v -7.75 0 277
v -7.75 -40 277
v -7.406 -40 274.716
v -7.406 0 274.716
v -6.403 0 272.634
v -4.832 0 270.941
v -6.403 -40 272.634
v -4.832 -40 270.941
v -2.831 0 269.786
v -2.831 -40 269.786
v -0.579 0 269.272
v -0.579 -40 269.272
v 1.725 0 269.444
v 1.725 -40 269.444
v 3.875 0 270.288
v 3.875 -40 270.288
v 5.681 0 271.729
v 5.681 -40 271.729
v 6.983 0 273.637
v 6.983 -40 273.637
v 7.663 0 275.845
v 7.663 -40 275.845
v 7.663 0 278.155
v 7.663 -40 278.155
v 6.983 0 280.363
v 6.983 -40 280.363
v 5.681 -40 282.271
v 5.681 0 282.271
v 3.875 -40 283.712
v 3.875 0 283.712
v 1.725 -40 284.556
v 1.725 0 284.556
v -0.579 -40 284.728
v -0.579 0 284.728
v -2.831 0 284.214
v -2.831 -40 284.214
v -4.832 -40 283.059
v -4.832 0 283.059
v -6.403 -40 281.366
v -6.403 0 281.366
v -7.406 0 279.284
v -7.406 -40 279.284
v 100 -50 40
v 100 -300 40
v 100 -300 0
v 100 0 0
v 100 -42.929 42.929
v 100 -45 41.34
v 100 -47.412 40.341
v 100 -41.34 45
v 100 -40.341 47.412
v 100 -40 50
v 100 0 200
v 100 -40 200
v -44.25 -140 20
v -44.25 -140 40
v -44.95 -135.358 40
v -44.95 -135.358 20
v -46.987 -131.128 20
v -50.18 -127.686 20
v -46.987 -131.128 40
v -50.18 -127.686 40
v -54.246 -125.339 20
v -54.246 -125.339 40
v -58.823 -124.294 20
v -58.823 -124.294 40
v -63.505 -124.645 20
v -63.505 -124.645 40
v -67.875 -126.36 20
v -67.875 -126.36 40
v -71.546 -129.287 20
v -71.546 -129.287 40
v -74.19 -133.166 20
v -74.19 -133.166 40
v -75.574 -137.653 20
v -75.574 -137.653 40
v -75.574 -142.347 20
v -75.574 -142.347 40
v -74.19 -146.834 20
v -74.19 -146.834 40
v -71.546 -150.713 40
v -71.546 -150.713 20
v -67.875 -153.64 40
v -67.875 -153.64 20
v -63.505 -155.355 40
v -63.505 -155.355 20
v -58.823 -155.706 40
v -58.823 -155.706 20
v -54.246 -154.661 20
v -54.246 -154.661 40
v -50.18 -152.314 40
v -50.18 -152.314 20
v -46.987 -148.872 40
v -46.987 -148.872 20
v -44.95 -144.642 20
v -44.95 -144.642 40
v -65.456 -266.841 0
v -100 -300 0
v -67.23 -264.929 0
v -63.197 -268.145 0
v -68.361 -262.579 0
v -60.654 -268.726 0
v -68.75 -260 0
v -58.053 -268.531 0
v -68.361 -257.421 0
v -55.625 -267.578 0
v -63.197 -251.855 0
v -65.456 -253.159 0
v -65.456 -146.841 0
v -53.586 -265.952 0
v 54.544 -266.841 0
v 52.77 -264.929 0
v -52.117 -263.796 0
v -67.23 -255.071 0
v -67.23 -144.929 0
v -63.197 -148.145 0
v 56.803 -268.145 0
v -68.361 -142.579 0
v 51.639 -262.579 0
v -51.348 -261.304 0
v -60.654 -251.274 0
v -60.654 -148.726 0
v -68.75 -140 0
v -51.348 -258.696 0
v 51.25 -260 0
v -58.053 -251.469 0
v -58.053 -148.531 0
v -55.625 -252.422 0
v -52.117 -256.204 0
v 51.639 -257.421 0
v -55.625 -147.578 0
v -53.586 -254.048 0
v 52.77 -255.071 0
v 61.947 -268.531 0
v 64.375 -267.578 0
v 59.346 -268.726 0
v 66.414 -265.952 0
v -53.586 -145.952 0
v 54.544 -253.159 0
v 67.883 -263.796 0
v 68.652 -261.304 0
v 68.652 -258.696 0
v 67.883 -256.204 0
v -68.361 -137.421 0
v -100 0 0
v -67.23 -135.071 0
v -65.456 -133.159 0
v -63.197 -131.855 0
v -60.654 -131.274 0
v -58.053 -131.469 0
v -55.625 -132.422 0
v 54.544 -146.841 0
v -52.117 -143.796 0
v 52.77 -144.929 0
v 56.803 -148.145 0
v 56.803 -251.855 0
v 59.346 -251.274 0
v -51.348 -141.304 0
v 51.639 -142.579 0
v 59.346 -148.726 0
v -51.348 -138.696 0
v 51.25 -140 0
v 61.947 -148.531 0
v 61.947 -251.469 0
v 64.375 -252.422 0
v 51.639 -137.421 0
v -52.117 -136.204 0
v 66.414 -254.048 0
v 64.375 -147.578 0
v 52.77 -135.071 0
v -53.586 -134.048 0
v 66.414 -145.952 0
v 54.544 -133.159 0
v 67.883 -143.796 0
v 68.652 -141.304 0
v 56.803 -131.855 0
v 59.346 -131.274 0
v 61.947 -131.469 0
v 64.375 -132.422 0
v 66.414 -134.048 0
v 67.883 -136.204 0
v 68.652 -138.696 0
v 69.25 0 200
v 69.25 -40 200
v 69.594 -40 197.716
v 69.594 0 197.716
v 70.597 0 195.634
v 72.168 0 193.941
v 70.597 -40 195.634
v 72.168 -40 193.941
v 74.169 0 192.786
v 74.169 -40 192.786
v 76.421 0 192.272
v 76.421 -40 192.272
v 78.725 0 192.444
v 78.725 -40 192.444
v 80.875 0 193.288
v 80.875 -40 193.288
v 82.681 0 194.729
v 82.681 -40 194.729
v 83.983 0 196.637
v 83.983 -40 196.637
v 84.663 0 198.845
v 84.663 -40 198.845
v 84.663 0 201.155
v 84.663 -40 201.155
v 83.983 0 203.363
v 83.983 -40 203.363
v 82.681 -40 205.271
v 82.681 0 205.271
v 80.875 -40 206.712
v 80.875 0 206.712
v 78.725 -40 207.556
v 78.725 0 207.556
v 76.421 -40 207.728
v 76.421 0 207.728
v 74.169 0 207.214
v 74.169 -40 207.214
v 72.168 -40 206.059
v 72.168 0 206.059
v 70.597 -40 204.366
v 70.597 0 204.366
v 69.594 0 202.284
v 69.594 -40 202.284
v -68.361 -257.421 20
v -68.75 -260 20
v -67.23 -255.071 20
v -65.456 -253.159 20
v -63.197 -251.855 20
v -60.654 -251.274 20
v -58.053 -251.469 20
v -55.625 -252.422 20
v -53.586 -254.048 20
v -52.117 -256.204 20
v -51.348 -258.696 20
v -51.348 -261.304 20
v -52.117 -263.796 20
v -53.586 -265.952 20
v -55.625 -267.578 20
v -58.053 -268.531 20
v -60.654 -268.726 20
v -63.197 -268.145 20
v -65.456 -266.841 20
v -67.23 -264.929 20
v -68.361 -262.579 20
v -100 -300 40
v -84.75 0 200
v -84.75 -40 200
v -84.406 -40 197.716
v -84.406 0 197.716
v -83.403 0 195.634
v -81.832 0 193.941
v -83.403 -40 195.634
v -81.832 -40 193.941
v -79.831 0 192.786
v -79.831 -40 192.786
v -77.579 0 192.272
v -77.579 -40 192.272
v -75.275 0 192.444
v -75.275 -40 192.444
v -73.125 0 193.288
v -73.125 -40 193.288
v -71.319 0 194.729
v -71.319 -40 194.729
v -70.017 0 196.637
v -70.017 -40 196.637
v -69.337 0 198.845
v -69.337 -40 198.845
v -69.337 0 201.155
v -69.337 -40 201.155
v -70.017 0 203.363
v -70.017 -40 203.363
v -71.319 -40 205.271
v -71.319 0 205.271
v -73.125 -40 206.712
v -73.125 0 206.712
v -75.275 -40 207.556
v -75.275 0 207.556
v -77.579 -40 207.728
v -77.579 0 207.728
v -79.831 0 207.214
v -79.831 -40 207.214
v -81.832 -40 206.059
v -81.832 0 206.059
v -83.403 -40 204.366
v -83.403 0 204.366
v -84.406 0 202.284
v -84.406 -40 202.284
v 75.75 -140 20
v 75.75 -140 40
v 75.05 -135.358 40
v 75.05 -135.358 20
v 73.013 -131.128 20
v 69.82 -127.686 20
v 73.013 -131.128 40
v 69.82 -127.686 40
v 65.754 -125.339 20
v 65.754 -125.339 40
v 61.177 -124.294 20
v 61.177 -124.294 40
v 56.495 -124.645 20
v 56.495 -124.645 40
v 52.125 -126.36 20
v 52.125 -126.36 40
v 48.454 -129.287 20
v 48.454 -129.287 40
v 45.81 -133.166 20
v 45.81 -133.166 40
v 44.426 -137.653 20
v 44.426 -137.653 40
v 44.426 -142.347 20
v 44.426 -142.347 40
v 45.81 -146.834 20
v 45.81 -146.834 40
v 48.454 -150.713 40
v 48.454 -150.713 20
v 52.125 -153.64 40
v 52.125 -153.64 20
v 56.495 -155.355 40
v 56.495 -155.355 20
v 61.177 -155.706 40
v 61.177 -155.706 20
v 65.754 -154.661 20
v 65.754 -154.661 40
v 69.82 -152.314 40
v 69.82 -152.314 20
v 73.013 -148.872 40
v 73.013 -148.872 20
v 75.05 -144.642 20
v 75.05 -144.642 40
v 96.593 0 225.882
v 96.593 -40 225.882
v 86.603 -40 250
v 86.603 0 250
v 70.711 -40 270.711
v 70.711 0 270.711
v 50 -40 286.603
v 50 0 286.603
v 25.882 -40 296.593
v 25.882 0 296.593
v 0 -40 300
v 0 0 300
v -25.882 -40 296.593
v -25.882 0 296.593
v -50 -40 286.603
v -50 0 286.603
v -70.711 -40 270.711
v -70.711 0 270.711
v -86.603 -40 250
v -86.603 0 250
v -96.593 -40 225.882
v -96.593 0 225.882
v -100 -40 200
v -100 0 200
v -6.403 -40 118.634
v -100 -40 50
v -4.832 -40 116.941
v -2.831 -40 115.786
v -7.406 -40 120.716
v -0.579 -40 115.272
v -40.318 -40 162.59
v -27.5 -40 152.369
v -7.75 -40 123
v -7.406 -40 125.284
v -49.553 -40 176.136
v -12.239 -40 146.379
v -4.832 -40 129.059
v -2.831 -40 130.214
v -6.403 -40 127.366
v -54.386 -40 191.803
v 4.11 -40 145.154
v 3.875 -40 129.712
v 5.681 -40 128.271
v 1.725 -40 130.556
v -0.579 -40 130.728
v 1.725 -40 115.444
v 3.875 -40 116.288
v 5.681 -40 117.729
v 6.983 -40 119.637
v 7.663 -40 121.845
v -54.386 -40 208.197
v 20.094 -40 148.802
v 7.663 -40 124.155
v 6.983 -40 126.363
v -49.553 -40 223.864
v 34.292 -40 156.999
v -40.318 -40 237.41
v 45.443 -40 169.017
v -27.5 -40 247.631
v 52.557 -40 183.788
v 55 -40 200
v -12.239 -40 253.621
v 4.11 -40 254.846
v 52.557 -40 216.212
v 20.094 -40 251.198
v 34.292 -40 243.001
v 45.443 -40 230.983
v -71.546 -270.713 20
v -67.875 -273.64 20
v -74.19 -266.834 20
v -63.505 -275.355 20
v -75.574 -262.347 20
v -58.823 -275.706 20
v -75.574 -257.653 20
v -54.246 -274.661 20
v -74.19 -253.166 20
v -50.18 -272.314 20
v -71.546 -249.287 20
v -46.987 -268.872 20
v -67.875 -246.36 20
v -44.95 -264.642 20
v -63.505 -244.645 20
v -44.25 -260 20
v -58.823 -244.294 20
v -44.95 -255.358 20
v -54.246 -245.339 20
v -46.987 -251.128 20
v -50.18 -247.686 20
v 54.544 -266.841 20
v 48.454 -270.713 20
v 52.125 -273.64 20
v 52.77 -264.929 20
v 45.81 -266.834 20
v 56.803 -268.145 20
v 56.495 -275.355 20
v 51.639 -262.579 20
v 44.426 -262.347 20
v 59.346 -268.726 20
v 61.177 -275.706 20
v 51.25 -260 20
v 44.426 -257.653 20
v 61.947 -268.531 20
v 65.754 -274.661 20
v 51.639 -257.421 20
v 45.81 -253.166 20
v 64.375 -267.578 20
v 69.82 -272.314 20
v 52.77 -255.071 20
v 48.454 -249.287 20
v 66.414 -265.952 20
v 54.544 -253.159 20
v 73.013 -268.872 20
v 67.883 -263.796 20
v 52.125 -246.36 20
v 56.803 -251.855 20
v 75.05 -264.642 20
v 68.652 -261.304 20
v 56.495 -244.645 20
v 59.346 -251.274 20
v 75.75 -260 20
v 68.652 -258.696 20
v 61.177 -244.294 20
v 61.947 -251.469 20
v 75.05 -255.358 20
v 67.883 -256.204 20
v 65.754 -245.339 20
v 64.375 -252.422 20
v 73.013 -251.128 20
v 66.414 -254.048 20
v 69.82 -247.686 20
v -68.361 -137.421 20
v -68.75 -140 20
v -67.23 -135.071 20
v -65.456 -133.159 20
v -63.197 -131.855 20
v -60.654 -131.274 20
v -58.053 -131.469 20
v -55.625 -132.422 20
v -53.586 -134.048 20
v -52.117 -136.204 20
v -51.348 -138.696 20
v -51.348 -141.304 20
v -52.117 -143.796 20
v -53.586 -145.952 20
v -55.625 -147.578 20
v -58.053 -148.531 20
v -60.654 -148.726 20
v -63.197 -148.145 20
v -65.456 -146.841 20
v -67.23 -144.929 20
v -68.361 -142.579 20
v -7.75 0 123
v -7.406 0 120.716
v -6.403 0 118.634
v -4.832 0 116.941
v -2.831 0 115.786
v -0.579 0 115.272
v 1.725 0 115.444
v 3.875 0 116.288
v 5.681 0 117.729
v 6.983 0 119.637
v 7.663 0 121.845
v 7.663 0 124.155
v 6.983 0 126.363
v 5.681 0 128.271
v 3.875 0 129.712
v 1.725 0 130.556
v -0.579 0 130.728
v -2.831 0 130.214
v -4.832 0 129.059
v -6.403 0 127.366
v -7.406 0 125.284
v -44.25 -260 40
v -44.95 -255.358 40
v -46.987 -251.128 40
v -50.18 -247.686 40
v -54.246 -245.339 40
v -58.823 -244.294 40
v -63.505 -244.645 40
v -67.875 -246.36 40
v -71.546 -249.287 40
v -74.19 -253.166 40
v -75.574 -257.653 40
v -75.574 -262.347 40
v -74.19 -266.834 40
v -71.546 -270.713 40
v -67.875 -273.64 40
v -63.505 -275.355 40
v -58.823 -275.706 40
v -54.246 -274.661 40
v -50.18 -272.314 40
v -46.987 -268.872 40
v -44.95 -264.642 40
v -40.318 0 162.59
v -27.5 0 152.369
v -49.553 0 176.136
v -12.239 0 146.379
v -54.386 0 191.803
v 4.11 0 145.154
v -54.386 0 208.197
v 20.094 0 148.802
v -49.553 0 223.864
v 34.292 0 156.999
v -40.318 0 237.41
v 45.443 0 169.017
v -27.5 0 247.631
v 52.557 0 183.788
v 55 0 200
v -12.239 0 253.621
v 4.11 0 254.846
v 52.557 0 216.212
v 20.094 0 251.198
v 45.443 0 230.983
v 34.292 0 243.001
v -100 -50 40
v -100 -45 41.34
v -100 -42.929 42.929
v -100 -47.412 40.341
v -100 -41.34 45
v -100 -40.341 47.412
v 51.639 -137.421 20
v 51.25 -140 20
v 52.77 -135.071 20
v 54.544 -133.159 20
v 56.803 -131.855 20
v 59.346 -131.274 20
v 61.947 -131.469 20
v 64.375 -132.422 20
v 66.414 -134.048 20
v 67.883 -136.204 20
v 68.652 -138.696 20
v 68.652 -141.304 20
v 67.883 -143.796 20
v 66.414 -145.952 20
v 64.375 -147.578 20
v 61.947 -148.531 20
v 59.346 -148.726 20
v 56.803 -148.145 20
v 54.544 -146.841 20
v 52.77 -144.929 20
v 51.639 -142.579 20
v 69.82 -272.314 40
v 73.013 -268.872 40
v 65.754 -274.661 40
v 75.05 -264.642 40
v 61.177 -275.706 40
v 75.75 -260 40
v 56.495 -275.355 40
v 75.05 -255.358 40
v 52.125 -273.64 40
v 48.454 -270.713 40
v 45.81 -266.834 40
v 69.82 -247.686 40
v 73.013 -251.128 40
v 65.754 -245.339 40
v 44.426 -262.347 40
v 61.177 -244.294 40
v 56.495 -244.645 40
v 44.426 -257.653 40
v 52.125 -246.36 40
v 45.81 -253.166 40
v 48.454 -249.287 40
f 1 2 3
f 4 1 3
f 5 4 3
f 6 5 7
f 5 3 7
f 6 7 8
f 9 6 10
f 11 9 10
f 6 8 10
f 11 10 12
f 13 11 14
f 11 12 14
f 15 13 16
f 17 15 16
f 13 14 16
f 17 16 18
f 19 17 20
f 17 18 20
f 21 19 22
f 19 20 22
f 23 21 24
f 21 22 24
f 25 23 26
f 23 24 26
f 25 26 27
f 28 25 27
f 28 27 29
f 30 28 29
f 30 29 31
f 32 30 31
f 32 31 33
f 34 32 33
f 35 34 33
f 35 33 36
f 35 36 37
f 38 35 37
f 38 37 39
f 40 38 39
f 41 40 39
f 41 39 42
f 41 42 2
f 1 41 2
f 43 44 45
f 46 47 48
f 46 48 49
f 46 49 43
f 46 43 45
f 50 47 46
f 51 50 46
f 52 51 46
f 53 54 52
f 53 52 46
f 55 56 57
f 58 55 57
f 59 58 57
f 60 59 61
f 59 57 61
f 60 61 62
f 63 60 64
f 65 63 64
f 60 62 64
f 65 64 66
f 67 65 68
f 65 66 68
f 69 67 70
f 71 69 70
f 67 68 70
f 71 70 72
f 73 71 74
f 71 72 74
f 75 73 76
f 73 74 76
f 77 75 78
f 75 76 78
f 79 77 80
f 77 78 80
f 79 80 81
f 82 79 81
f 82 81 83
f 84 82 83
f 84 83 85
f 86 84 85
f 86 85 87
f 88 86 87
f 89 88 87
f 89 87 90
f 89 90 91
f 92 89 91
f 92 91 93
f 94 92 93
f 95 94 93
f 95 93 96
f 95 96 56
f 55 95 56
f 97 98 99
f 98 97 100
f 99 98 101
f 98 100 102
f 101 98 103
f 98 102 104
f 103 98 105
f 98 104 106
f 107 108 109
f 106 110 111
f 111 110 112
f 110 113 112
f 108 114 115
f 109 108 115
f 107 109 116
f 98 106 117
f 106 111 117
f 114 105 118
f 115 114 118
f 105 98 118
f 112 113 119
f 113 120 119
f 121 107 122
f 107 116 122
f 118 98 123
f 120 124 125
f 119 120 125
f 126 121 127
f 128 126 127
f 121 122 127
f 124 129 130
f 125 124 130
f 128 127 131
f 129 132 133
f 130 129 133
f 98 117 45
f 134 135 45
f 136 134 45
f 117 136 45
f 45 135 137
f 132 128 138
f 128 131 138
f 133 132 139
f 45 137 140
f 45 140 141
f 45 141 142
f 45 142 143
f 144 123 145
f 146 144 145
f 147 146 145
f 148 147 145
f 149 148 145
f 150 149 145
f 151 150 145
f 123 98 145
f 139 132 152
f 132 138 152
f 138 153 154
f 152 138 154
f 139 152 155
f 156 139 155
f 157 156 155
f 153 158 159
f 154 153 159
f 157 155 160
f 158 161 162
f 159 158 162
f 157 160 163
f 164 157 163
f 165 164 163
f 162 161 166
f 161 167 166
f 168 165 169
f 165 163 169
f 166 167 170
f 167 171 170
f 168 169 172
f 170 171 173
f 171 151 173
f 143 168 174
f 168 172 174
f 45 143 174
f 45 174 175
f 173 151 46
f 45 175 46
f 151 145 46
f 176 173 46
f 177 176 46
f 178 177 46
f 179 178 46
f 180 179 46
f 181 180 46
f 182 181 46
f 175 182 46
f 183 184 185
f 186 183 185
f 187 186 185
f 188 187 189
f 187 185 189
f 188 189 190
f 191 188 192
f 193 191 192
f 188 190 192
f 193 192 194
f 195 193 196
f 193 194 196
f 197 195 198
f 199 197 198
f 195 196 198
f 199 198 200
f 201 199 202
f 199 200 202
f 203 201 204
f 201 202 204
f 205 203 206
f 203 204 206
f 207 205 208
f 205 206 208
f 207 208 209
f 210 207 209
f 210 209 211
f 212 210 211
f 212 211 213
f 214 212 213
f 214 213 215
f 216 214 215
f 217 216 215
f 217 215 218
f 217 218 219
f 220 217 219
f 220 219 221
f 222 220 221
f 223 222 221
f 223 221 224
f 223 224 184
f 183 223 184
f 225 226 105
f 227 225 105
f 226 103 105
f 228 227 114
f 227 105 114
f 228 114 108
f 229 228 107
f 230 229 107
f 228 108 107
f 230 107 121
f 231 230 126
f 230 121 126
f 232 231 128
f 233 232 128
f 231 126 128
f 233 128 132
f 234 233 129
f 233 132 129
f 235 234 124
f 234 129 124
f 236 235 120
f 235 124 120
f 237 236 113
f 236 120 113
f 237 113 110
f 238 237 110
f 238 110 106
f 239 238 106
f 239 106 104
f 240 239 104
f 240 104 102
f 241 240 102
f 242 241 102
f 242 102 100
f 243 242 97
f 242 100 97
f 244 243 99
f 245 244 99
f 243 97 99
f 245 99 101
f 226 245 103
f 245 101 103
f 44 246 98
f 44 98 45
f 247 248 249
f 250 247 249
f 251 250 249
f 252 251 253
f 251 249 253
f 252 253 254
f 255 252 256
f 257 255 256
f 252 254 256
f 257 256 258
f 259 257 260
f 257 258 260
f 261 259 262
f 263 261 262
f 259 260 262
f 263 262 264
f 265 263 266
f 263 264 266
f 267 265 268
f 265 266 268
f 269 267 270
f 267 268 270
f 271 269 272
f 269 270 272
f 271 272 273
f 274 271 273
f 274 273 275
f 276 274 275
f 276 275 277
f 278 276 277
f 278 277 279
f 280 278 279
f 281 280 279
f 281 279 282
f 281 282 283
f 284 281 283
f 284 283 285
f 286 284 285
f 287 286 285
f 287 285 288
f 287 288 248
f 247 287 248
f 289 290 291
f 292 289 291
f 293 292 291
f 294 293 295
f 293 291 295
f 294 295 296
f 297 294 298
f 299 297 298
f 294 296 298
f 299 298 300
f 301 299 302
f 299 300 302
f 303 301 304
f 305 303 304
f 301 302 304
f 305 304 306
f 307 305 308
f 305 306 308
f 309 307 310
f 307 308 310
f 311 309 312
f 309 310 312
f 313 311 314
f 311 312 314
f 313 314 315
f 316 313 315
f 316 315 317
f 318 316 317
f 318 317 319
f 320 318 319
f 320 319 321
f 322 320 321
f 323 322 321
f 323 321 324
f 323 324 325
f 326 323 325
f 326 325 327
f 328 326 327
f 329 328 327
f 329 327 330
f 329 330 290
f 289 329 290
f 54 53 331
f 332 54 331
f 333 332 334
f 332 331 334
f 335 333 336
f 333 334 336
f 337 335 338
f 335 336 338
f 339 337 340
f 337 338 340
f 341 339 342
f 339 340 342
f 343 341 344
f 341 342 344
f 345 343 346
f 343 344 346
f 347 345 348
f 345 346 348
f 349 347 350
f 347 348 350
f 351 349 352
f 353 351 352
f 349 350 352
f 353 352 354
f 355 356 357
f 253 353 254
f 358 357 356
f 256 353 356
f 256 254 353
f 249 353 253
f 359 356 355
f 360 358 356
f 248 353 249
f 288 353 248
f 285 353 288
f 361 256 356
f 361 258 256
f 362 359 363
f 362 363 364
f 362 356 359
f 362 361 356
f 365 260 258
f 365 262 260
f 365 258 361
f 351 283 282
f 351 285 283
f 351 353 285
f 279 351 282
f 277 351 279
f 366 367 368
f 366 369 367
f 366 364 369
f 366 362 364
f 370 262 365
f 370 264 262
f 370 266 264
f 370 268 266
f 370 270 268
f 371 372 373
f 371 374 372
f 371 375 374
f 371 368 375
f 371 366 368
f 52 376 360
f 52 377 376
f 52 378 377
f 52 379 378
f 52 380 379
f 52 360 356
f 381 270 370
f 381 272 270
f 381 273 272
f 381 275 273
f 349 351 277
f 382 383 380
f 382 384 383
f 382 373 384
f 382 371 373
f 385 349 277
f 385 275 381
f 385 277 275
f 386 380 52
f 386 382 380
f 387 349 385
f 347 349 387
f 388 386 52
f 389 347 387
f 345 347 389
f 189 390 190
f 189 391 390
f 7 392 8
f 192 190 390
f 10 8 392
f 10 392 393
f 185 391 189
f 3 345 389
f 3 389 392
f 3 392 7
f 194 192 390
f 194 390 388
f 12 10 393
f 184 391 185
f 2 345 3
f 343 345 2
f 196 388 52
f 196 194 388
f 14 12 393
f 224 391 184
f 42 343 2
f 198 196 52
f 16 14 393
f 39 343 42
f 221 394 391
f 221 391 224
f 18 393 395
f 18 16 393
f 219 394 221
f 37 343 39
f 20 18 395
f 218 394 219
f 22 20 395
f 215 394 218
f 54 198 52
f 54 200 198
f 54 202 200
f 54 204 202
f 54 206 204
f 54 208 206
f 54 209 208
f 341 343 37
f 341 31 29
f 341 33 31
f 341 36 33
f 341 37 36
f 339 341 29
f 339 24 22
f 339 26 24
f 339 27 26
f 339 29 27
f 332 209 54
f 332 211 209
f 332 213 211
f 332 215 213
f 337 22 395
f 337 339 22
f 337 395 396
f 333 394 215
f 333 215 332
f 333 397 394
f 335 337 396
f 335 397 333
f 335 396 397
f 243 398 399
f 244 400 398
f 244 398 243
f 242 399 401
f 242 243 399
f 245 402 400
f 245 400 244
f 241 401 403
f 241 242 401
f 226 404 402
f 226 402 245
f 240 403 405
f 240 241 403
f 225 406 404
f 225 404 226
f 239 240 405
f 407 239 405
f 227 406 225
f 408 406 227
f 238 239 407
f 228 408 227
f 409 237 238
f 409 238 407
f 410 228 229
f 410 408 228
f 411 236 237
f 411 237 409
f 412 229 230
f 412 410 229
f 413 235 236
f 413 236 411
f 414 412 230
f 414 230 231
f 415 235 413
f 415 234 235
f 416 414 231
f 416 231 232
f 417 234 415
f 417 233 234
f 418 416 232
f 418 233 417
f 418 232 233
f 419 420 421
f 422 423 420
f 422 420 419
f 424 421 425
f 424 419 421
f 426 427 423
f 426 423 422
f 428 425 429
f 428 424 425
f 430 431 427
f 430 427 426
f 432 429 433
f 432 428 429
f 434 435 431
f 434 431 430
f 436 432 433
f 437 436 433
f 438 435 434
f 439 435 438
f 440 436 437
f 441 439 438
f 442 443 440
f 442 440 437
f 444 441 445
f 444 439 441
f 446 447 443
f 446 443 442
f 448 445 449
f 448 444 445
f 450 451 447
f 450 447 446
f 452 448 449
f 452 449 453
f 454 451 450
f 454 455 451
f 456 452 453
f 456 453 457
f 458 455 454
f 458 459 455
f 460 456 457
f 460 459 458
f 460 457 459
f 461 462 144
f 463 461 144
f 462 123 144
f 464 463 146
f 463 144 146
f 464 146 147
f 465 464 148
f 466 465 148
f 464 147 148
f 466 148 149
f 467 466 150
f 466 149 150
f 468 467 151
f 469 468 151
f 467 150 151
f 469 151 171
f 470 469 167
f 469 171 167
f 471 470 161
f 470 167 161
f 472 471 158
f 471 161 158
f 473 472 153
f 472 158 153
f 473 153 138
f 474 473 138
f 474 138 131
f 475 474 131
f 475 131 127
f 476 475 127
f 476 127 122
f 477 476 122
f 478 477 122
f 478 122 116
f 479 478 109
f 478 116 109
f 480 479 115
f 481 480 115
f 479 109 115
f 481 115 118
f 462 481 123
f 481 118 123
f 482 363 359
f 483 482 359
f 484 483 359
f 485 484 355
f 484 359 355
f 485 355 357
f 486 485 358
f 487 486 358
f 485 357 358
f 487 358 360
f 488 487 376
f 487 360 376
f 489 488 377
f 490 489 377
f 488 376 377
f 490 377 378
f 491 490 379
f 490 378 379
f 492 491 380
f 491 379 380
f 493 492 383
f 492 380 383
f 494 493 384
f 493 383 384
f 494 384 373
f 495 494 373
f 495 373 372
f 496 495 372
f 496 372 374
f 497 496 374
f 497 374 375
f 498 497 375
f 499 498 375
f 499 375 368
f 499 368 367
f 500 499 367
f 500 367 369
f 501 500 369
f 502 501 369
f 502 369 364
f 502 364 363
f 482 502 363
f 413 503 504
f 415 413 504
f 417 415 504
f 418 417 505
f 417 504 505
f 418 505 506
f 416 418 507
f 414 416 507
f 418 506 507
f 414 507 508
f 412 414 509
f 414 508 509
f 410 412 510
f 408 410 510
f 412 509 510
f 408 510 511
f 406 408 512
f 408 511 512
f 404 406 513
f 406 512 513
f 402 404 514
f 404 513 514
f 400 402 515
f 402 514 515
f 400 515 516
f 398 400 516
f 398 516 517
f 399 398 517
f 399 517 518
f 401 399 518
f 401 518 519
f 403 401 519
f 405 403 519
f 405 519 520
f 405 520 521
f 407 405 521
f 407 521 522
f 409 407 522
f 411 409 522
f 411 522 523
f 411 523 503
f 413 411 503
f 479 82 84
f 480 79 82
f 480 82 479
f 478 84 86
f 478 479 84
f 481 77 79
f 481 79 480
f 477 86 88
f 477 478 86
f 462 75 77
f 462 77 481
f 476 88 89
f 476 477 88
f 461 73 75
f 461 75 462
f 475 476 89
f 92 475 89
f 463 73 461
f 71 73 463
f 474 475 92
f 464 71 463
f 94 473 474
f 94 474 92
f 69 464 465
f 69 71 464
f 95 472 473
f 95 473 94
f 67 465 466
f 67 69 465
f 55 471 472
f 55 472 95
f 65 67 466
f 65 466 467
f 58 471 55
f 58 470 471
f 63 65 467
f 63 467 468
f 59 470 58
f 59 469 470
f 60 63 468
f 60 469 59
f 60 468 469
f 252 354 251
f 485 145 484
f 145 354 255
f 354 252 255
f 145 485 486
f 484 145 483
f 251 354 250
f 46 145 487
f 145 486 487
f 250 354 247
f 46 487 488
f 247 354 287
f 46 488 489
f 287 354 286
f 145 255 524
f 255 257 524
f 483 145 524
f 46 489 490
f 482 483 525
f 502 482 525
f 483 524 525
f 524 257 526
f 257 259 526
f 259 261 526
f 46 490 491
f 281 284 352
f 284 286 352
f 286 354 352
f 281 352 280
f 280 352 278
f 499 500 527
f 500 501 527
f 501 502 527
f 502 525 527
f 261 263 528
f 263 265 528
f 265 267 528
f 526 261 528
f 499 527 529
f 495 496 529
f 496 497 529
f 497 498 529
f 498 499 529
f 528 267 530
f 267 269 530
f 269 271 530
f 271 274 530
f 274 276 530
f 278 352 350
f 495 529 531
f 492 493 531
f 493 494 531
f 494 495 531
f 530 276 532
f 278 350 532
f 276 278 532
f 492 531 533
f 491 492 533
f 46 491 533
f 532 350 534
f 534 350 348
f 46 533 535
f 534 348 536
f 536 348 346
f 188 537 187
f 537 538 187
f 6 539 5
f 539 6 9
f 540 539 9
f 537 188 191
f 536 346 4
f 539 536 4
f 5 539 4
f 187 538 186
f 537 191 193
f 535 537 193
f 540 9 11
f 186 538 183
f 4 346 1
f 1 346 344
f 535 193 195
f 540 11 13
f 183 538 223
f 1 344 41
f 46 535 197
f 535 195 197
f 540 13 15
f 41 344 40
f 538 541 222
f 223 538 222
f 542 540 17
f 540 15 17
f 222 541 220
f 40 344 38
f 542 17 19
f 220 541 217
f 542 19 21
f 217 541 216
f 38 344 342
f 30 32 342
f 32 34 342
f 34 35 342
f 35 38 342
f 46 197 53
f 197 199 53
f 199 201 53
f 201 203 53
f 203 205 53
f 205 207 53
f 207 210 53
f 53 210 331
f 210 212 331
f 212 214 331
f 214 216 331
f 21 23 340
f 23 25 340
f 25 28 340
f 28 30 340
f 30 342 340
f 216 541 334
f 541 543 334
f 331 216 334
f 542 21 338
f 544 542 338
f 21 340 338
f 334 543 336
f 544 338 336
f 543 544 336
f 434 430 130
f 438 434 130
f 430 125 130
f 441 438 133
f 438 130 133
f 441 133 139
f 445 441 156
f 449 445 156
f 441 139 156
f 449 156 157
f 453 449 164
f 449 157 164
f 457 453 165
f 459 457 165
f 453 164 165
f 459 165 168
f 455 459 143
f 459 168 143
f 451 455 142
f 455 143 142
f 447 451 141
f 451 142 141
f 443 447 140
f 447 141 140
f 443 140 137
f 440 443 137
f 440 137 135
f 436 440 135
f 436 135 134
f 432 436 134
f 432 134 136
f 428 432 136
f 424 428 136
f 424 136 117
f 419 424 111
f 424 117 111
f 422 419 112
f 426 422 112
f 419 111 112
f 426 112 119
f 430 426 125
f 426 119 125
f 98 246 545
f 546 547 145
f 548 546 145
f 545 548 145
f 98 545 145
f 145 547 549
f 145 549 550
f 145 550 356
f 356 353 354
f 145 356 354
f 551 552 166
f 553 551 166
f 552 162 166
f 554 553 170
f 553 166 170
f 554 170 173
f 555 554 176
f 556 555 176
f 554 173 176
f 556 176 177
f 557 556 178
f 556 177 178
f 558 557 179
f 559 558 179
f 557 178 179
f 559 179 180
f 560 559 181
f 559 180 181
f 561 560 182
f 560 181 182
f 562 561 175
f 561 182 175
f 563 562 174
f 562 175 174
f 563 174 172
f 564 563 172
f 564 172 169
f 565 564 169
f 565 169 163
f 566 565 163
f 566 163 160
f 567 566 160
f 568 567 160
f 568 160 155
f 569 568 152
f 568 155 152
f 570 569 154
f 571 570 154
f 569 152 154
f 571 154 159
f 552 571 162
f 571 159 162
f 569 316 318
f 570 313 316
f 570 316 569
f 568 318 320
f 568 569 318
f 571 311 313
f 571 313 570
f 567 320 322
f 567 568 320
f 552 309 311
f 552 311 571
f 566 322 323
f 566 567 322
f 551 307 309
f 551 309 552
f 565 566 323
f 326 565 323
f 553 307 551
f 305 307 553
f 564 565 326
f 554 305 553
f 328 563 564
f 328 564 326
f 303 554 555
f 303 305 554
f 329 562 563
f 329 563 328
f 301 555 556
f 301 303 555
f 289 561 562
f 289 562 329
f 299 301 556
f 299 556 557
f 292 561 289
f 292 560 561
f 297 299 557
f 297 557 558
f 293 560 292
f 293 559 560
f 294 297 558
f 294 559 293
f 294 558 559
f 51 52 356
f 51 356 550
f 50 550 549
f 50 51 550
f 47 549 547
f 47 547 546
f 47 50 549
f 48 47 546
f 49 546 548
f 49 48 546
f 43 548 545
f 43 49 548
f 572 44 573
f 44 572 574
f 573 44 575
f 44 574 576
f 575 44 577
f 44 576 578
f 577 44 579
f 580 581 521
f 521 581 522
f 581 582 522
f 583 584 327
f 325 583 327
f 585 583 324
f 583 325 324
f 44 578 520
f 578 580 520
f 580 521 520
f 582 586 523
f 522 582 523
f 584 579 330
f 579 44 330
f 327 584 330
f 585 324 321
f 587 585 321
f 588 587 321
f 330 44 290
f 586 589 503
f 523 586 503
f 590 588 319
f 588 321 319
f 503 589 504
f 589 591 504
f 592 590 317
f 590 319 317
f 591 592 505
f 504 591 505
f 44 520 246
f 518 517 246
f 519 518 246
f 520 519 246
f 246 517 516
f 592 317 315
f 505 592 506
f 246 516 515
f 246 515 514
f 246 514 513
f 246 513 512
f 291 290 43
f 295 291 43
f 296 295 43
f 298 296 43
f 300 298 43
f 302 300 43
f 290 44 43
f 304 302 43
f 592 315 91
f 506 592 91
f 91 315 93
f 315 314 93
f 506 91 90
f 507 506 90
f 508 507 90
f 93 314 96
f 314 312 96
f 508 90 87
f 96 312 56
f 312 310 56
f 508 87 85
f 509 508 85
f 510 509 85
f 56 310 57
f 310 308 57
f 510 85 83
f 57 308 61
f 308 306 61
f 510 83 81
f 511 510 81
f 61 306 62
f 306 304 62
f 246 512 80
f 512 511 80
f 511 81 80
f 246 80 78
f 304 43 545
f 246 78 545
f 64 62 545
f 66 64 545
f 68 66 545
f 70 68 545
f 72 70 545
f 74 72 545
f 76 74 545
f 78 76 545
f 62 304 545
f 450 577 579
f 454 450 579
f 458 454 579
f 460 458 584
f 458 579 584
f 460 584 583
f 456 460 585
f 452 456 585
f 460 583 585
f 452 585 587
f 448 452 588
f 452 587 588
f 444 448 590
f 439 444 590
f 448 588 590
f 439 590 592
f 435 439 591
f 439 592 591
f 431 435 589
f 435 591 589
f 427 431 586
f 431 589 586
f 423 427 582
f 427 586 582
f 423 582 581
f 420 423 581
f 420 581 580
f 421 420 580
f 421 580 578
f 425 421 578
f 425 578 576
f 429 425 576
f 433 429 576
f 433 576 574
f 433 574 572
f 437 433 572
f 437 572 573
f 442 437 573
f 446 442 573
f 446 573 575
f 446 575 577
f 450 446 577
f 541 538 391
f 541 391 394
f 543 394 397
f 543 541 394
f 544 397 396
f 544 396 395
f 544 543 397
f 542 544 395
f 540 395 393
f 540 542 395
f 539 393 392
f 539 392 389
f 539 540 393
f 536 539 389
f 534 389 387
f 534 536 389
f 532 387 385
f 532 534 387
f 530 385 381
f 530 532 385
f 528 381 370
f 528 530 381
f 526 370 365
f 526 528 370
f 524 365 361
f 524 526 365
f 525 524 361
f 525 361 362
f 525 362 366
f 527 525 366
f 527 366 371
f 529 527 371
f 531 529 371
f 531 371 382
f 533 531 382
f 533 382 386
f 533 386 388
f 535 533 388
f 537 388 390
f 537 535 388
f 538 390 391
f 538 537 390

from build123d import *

# Parameters (mm, degrees)
F0_R           = 55
F1_DEPTH       = 40
F2_DEPTH       = 300
F3_D           = 15.5
F5_D           = 17.5
F5_CBORE_D     = 31.5
F5_CBORE_DEPTH = 20
F7_DEPTH       = 200


with BuildPart() as f1:
    # F0 (on Front) → F1 (new body)
    with BuildSketch(Plane.XZ):
        with BuildLine():
            Line((-100, 40), (100, 40))
            Line((100, 40), (100, 200))
            ThreePointArc((100, 200), (0, 300), (-100, 200))
            Line((-100, 200), (-100, 40))
        make_face()
        with Locations((0, 200)):
            Circle(F0_R, mode=Mode.SUBTRACT)
    extrude(amount=F1_DEPTH)

    # F0 (on Front) → F2 (join)
    with BuildSketch(Plane.XZ):
        Polygon((-98.9183791646, 0), (0, 0), (100, 0), (100, 40), (-100, 40), (-100, 0), align=None)
    extrude(amount=F2_DEPTH)

    # F3 (through all)
    with Locations(Plane(origin=(0, 0, 0), x_dir=(1, 0, 0), z_dir=(0, 1, 0))):
        with Locations((0, -277), (-77, -200), (77, -200), (0, -123)):
            Hole(F3_D / 2)

    # F5 (through all)
    with Locations(Plane.XY.offset(40)):
        with Locations((-60, -140), (60, -140), (60, -260), (-60, -260)):
            CounterBoreHole(F5_D / 2, F5_CBORE_D / 2, F5_CBORE_DEPTH)

    # F6 (on face) → F7 (join)
    with BuildSketch(Plane.YZ.offset(100)):
        with BuildLine():
            ThreePointArc((-40, 50), (-42.9289321881, 42.9289321881), (-50, 40))
            Line((-50, 40), (-40, 40))
            Line((-40, 40), (-40, 50))
        make_face()
    extrude(amount=-F7_DEPTH)


solid = f1.part
